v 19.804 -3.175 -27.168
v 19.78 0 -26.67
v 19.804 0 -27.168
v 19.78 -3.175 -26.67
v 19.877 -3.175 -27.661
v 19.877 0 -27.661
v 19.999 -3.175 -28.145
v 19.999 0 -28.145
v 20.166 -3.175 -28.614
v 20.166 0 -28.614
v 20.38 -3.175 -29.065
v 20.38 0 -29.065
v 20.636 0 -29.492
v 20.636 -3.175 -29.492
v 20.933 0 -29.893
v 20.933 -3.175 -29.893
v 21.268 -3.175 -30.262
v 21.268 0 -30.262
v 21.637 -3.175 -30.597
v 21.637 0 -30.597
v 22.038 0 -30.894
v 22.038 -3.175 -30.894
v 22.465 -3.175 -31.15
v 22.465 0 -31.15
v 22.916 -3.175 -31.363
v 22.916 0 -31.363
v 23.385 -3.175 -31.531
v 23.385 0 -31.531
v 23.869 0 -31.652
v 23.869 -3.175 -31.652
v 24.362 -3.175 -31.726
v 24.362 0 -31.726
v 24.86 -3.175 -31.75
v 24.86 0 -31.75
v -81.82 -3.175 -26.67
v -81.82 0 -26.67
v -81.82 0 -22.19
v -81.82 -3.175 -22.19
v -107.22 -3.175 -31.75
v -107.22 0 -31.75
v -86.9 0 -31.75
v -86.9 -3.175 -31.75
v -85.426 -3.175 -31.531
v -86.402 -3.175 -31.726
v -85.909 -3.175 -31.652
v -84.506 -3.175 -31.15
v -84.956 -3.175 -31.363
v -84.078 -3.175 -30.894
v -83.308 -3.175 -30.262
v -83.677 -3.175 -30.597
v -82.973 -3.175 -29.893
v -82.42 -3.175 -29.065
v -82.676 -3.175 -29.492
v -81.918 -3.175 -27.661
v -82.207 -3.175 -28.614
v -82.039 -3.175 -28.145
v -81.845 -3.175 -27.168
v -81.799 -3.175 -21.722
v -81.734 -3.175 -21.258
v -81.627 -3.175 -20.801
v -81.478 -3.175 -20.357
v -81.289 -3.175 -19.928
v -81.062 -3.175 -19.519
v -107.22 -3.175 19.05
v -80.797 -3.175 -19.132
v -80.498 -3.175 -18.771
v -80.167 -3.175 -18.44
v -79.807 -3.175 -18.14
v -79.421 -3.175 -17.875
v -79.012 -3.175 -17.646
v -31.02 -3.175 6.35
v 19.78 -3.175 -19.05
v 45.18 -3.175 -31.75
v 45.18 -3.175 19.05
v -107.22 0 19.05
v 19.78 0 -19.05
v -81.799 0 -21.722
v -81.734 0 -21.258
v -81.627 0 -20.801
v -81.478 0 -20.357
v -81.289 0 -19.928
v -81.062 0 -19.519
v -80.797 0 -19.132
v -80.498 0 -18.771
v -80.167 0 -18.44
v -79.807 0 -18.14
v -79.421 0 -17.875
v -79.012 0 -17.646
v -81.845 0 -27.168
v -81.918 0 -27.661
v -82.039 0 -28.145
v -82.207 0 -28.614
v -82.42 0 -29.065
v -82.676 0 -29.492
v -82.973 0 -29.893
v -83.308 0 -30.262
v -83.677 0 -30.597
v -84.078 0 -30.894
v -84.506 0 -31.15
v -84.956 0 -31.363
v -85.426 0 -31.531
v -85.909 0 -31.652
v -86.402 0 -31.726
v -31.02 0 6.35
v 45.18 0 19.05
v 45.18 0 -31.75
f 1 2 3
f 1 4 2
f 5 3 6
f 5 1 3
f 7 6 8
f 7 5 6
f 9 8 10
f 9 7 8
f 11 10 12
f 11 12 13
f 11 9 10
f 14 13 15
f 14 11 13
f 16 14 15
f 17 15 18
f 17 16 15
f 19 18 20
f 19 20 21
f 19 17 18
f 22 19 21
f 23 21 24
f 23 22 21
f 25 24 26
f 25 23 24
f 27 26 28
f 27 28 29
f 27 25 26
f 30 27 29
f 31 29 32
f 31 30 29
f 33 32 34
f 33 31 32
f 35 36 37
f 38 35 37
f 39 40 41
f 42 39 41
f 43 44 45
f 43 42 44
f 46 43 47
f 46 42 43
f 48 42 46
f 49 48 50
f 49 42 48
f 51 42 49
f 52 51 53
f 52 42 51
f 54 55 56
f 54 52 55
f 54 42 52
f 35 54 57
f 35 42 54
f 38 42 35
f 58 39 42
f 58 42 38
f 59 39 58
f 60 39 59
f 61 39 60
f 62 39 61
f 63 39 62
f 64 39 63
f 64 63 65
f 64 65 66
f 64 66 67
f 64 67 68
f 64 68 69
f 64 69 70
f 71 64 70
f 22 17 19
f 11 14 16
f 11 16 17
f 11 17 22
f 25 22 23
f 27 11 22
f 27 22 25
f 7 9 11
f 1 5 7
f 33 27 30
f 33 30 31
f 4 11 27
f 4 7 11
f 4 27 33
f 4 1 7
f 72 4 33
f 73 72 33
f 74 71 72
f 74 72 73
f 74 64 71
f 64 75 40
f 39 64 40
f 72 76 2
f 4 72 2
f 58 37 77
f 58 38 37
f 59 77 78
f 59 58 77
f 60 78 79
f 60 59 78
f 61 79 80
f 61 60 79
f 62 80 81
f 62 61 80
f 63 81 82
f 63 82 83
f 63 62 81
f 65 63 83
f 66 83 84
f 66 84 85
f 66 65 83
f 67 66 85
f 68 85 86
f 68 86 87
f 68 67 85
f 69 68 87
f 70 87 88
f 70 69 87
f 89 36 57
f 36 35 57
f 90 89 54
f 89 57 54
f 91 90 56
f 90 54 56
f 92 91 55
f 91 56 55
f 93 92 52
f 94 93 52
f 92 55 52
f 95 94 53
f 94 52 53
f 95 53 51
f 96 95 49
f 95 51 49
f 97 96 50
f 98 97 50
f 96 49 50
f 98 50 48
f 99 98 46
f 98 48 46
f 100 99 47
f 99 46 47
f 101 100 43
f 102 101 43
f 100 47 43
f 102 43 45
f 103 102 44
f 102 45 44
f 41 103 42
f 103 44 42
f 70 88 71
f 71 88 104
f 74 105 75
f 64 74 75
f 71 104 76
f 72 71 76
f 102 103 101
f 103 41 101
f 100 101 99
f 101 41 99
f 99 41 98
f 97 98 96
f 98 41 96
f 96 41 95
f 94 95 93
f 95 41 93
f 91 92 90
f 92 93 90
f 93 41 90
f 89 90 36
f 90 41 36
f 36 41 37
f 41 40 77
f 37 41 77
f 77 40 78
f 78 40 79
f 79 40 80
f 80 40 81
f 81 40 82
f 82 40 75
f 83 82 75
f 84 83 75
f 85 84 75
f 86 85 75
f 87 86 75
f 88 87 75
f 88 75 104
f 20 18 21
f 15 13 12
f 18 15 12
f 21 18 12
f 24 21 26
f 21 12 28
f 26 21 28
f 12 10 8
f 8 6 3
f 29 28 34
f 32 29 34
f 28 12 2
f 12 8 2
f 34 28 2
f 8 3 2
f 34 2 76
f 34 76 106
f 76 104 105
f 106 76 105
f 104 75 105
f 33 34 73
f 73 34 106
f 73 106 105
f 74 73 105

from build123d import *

# Parameters (mm, degrees)
F1_DEPTH = 3.175
F2_R     = 5.08
F3_R     = 5.08


# Not quite as in the source:
# - a feature names something its author has since deleted; it is built from what else it names


with BuildPart() as f1:
    # F0 (on Front) → F1 (new body)
    with BuildSketch(Plane.XZ):
        Polygon((45.1797973156, 19.05), (-107.2202026844, 19.05), (-107.2202026844, -31.75), (-81.8202026844, -31.75), (-81.8202026844, -19.05), (-31.0202026844, 6.35), (19.7797973156, -19.05), (19.7797973156, -31.75), (45.1797973156, -31.75), (45.1797973156, -6.35), align=None)
    extrude(amount=F1_DEPTH)

    # F2
    f2_edges = [f1.edges().sort_by_distance(p)[0] for p in [
        (-81.820203, -1.5875, -19.05),
    ]]
    fillet(f2_edges, radius=F2_R)

    # F3
    f3_edges = [f1.edges().sort_by_distance(p)[0] for p in [
        (-81.820203, -1.5875, -31.75),
        (19.779797, -1.5875, -31.75),
    ]]
    fillet(f3_edges, radius=F3_R)


solid = f1.part
